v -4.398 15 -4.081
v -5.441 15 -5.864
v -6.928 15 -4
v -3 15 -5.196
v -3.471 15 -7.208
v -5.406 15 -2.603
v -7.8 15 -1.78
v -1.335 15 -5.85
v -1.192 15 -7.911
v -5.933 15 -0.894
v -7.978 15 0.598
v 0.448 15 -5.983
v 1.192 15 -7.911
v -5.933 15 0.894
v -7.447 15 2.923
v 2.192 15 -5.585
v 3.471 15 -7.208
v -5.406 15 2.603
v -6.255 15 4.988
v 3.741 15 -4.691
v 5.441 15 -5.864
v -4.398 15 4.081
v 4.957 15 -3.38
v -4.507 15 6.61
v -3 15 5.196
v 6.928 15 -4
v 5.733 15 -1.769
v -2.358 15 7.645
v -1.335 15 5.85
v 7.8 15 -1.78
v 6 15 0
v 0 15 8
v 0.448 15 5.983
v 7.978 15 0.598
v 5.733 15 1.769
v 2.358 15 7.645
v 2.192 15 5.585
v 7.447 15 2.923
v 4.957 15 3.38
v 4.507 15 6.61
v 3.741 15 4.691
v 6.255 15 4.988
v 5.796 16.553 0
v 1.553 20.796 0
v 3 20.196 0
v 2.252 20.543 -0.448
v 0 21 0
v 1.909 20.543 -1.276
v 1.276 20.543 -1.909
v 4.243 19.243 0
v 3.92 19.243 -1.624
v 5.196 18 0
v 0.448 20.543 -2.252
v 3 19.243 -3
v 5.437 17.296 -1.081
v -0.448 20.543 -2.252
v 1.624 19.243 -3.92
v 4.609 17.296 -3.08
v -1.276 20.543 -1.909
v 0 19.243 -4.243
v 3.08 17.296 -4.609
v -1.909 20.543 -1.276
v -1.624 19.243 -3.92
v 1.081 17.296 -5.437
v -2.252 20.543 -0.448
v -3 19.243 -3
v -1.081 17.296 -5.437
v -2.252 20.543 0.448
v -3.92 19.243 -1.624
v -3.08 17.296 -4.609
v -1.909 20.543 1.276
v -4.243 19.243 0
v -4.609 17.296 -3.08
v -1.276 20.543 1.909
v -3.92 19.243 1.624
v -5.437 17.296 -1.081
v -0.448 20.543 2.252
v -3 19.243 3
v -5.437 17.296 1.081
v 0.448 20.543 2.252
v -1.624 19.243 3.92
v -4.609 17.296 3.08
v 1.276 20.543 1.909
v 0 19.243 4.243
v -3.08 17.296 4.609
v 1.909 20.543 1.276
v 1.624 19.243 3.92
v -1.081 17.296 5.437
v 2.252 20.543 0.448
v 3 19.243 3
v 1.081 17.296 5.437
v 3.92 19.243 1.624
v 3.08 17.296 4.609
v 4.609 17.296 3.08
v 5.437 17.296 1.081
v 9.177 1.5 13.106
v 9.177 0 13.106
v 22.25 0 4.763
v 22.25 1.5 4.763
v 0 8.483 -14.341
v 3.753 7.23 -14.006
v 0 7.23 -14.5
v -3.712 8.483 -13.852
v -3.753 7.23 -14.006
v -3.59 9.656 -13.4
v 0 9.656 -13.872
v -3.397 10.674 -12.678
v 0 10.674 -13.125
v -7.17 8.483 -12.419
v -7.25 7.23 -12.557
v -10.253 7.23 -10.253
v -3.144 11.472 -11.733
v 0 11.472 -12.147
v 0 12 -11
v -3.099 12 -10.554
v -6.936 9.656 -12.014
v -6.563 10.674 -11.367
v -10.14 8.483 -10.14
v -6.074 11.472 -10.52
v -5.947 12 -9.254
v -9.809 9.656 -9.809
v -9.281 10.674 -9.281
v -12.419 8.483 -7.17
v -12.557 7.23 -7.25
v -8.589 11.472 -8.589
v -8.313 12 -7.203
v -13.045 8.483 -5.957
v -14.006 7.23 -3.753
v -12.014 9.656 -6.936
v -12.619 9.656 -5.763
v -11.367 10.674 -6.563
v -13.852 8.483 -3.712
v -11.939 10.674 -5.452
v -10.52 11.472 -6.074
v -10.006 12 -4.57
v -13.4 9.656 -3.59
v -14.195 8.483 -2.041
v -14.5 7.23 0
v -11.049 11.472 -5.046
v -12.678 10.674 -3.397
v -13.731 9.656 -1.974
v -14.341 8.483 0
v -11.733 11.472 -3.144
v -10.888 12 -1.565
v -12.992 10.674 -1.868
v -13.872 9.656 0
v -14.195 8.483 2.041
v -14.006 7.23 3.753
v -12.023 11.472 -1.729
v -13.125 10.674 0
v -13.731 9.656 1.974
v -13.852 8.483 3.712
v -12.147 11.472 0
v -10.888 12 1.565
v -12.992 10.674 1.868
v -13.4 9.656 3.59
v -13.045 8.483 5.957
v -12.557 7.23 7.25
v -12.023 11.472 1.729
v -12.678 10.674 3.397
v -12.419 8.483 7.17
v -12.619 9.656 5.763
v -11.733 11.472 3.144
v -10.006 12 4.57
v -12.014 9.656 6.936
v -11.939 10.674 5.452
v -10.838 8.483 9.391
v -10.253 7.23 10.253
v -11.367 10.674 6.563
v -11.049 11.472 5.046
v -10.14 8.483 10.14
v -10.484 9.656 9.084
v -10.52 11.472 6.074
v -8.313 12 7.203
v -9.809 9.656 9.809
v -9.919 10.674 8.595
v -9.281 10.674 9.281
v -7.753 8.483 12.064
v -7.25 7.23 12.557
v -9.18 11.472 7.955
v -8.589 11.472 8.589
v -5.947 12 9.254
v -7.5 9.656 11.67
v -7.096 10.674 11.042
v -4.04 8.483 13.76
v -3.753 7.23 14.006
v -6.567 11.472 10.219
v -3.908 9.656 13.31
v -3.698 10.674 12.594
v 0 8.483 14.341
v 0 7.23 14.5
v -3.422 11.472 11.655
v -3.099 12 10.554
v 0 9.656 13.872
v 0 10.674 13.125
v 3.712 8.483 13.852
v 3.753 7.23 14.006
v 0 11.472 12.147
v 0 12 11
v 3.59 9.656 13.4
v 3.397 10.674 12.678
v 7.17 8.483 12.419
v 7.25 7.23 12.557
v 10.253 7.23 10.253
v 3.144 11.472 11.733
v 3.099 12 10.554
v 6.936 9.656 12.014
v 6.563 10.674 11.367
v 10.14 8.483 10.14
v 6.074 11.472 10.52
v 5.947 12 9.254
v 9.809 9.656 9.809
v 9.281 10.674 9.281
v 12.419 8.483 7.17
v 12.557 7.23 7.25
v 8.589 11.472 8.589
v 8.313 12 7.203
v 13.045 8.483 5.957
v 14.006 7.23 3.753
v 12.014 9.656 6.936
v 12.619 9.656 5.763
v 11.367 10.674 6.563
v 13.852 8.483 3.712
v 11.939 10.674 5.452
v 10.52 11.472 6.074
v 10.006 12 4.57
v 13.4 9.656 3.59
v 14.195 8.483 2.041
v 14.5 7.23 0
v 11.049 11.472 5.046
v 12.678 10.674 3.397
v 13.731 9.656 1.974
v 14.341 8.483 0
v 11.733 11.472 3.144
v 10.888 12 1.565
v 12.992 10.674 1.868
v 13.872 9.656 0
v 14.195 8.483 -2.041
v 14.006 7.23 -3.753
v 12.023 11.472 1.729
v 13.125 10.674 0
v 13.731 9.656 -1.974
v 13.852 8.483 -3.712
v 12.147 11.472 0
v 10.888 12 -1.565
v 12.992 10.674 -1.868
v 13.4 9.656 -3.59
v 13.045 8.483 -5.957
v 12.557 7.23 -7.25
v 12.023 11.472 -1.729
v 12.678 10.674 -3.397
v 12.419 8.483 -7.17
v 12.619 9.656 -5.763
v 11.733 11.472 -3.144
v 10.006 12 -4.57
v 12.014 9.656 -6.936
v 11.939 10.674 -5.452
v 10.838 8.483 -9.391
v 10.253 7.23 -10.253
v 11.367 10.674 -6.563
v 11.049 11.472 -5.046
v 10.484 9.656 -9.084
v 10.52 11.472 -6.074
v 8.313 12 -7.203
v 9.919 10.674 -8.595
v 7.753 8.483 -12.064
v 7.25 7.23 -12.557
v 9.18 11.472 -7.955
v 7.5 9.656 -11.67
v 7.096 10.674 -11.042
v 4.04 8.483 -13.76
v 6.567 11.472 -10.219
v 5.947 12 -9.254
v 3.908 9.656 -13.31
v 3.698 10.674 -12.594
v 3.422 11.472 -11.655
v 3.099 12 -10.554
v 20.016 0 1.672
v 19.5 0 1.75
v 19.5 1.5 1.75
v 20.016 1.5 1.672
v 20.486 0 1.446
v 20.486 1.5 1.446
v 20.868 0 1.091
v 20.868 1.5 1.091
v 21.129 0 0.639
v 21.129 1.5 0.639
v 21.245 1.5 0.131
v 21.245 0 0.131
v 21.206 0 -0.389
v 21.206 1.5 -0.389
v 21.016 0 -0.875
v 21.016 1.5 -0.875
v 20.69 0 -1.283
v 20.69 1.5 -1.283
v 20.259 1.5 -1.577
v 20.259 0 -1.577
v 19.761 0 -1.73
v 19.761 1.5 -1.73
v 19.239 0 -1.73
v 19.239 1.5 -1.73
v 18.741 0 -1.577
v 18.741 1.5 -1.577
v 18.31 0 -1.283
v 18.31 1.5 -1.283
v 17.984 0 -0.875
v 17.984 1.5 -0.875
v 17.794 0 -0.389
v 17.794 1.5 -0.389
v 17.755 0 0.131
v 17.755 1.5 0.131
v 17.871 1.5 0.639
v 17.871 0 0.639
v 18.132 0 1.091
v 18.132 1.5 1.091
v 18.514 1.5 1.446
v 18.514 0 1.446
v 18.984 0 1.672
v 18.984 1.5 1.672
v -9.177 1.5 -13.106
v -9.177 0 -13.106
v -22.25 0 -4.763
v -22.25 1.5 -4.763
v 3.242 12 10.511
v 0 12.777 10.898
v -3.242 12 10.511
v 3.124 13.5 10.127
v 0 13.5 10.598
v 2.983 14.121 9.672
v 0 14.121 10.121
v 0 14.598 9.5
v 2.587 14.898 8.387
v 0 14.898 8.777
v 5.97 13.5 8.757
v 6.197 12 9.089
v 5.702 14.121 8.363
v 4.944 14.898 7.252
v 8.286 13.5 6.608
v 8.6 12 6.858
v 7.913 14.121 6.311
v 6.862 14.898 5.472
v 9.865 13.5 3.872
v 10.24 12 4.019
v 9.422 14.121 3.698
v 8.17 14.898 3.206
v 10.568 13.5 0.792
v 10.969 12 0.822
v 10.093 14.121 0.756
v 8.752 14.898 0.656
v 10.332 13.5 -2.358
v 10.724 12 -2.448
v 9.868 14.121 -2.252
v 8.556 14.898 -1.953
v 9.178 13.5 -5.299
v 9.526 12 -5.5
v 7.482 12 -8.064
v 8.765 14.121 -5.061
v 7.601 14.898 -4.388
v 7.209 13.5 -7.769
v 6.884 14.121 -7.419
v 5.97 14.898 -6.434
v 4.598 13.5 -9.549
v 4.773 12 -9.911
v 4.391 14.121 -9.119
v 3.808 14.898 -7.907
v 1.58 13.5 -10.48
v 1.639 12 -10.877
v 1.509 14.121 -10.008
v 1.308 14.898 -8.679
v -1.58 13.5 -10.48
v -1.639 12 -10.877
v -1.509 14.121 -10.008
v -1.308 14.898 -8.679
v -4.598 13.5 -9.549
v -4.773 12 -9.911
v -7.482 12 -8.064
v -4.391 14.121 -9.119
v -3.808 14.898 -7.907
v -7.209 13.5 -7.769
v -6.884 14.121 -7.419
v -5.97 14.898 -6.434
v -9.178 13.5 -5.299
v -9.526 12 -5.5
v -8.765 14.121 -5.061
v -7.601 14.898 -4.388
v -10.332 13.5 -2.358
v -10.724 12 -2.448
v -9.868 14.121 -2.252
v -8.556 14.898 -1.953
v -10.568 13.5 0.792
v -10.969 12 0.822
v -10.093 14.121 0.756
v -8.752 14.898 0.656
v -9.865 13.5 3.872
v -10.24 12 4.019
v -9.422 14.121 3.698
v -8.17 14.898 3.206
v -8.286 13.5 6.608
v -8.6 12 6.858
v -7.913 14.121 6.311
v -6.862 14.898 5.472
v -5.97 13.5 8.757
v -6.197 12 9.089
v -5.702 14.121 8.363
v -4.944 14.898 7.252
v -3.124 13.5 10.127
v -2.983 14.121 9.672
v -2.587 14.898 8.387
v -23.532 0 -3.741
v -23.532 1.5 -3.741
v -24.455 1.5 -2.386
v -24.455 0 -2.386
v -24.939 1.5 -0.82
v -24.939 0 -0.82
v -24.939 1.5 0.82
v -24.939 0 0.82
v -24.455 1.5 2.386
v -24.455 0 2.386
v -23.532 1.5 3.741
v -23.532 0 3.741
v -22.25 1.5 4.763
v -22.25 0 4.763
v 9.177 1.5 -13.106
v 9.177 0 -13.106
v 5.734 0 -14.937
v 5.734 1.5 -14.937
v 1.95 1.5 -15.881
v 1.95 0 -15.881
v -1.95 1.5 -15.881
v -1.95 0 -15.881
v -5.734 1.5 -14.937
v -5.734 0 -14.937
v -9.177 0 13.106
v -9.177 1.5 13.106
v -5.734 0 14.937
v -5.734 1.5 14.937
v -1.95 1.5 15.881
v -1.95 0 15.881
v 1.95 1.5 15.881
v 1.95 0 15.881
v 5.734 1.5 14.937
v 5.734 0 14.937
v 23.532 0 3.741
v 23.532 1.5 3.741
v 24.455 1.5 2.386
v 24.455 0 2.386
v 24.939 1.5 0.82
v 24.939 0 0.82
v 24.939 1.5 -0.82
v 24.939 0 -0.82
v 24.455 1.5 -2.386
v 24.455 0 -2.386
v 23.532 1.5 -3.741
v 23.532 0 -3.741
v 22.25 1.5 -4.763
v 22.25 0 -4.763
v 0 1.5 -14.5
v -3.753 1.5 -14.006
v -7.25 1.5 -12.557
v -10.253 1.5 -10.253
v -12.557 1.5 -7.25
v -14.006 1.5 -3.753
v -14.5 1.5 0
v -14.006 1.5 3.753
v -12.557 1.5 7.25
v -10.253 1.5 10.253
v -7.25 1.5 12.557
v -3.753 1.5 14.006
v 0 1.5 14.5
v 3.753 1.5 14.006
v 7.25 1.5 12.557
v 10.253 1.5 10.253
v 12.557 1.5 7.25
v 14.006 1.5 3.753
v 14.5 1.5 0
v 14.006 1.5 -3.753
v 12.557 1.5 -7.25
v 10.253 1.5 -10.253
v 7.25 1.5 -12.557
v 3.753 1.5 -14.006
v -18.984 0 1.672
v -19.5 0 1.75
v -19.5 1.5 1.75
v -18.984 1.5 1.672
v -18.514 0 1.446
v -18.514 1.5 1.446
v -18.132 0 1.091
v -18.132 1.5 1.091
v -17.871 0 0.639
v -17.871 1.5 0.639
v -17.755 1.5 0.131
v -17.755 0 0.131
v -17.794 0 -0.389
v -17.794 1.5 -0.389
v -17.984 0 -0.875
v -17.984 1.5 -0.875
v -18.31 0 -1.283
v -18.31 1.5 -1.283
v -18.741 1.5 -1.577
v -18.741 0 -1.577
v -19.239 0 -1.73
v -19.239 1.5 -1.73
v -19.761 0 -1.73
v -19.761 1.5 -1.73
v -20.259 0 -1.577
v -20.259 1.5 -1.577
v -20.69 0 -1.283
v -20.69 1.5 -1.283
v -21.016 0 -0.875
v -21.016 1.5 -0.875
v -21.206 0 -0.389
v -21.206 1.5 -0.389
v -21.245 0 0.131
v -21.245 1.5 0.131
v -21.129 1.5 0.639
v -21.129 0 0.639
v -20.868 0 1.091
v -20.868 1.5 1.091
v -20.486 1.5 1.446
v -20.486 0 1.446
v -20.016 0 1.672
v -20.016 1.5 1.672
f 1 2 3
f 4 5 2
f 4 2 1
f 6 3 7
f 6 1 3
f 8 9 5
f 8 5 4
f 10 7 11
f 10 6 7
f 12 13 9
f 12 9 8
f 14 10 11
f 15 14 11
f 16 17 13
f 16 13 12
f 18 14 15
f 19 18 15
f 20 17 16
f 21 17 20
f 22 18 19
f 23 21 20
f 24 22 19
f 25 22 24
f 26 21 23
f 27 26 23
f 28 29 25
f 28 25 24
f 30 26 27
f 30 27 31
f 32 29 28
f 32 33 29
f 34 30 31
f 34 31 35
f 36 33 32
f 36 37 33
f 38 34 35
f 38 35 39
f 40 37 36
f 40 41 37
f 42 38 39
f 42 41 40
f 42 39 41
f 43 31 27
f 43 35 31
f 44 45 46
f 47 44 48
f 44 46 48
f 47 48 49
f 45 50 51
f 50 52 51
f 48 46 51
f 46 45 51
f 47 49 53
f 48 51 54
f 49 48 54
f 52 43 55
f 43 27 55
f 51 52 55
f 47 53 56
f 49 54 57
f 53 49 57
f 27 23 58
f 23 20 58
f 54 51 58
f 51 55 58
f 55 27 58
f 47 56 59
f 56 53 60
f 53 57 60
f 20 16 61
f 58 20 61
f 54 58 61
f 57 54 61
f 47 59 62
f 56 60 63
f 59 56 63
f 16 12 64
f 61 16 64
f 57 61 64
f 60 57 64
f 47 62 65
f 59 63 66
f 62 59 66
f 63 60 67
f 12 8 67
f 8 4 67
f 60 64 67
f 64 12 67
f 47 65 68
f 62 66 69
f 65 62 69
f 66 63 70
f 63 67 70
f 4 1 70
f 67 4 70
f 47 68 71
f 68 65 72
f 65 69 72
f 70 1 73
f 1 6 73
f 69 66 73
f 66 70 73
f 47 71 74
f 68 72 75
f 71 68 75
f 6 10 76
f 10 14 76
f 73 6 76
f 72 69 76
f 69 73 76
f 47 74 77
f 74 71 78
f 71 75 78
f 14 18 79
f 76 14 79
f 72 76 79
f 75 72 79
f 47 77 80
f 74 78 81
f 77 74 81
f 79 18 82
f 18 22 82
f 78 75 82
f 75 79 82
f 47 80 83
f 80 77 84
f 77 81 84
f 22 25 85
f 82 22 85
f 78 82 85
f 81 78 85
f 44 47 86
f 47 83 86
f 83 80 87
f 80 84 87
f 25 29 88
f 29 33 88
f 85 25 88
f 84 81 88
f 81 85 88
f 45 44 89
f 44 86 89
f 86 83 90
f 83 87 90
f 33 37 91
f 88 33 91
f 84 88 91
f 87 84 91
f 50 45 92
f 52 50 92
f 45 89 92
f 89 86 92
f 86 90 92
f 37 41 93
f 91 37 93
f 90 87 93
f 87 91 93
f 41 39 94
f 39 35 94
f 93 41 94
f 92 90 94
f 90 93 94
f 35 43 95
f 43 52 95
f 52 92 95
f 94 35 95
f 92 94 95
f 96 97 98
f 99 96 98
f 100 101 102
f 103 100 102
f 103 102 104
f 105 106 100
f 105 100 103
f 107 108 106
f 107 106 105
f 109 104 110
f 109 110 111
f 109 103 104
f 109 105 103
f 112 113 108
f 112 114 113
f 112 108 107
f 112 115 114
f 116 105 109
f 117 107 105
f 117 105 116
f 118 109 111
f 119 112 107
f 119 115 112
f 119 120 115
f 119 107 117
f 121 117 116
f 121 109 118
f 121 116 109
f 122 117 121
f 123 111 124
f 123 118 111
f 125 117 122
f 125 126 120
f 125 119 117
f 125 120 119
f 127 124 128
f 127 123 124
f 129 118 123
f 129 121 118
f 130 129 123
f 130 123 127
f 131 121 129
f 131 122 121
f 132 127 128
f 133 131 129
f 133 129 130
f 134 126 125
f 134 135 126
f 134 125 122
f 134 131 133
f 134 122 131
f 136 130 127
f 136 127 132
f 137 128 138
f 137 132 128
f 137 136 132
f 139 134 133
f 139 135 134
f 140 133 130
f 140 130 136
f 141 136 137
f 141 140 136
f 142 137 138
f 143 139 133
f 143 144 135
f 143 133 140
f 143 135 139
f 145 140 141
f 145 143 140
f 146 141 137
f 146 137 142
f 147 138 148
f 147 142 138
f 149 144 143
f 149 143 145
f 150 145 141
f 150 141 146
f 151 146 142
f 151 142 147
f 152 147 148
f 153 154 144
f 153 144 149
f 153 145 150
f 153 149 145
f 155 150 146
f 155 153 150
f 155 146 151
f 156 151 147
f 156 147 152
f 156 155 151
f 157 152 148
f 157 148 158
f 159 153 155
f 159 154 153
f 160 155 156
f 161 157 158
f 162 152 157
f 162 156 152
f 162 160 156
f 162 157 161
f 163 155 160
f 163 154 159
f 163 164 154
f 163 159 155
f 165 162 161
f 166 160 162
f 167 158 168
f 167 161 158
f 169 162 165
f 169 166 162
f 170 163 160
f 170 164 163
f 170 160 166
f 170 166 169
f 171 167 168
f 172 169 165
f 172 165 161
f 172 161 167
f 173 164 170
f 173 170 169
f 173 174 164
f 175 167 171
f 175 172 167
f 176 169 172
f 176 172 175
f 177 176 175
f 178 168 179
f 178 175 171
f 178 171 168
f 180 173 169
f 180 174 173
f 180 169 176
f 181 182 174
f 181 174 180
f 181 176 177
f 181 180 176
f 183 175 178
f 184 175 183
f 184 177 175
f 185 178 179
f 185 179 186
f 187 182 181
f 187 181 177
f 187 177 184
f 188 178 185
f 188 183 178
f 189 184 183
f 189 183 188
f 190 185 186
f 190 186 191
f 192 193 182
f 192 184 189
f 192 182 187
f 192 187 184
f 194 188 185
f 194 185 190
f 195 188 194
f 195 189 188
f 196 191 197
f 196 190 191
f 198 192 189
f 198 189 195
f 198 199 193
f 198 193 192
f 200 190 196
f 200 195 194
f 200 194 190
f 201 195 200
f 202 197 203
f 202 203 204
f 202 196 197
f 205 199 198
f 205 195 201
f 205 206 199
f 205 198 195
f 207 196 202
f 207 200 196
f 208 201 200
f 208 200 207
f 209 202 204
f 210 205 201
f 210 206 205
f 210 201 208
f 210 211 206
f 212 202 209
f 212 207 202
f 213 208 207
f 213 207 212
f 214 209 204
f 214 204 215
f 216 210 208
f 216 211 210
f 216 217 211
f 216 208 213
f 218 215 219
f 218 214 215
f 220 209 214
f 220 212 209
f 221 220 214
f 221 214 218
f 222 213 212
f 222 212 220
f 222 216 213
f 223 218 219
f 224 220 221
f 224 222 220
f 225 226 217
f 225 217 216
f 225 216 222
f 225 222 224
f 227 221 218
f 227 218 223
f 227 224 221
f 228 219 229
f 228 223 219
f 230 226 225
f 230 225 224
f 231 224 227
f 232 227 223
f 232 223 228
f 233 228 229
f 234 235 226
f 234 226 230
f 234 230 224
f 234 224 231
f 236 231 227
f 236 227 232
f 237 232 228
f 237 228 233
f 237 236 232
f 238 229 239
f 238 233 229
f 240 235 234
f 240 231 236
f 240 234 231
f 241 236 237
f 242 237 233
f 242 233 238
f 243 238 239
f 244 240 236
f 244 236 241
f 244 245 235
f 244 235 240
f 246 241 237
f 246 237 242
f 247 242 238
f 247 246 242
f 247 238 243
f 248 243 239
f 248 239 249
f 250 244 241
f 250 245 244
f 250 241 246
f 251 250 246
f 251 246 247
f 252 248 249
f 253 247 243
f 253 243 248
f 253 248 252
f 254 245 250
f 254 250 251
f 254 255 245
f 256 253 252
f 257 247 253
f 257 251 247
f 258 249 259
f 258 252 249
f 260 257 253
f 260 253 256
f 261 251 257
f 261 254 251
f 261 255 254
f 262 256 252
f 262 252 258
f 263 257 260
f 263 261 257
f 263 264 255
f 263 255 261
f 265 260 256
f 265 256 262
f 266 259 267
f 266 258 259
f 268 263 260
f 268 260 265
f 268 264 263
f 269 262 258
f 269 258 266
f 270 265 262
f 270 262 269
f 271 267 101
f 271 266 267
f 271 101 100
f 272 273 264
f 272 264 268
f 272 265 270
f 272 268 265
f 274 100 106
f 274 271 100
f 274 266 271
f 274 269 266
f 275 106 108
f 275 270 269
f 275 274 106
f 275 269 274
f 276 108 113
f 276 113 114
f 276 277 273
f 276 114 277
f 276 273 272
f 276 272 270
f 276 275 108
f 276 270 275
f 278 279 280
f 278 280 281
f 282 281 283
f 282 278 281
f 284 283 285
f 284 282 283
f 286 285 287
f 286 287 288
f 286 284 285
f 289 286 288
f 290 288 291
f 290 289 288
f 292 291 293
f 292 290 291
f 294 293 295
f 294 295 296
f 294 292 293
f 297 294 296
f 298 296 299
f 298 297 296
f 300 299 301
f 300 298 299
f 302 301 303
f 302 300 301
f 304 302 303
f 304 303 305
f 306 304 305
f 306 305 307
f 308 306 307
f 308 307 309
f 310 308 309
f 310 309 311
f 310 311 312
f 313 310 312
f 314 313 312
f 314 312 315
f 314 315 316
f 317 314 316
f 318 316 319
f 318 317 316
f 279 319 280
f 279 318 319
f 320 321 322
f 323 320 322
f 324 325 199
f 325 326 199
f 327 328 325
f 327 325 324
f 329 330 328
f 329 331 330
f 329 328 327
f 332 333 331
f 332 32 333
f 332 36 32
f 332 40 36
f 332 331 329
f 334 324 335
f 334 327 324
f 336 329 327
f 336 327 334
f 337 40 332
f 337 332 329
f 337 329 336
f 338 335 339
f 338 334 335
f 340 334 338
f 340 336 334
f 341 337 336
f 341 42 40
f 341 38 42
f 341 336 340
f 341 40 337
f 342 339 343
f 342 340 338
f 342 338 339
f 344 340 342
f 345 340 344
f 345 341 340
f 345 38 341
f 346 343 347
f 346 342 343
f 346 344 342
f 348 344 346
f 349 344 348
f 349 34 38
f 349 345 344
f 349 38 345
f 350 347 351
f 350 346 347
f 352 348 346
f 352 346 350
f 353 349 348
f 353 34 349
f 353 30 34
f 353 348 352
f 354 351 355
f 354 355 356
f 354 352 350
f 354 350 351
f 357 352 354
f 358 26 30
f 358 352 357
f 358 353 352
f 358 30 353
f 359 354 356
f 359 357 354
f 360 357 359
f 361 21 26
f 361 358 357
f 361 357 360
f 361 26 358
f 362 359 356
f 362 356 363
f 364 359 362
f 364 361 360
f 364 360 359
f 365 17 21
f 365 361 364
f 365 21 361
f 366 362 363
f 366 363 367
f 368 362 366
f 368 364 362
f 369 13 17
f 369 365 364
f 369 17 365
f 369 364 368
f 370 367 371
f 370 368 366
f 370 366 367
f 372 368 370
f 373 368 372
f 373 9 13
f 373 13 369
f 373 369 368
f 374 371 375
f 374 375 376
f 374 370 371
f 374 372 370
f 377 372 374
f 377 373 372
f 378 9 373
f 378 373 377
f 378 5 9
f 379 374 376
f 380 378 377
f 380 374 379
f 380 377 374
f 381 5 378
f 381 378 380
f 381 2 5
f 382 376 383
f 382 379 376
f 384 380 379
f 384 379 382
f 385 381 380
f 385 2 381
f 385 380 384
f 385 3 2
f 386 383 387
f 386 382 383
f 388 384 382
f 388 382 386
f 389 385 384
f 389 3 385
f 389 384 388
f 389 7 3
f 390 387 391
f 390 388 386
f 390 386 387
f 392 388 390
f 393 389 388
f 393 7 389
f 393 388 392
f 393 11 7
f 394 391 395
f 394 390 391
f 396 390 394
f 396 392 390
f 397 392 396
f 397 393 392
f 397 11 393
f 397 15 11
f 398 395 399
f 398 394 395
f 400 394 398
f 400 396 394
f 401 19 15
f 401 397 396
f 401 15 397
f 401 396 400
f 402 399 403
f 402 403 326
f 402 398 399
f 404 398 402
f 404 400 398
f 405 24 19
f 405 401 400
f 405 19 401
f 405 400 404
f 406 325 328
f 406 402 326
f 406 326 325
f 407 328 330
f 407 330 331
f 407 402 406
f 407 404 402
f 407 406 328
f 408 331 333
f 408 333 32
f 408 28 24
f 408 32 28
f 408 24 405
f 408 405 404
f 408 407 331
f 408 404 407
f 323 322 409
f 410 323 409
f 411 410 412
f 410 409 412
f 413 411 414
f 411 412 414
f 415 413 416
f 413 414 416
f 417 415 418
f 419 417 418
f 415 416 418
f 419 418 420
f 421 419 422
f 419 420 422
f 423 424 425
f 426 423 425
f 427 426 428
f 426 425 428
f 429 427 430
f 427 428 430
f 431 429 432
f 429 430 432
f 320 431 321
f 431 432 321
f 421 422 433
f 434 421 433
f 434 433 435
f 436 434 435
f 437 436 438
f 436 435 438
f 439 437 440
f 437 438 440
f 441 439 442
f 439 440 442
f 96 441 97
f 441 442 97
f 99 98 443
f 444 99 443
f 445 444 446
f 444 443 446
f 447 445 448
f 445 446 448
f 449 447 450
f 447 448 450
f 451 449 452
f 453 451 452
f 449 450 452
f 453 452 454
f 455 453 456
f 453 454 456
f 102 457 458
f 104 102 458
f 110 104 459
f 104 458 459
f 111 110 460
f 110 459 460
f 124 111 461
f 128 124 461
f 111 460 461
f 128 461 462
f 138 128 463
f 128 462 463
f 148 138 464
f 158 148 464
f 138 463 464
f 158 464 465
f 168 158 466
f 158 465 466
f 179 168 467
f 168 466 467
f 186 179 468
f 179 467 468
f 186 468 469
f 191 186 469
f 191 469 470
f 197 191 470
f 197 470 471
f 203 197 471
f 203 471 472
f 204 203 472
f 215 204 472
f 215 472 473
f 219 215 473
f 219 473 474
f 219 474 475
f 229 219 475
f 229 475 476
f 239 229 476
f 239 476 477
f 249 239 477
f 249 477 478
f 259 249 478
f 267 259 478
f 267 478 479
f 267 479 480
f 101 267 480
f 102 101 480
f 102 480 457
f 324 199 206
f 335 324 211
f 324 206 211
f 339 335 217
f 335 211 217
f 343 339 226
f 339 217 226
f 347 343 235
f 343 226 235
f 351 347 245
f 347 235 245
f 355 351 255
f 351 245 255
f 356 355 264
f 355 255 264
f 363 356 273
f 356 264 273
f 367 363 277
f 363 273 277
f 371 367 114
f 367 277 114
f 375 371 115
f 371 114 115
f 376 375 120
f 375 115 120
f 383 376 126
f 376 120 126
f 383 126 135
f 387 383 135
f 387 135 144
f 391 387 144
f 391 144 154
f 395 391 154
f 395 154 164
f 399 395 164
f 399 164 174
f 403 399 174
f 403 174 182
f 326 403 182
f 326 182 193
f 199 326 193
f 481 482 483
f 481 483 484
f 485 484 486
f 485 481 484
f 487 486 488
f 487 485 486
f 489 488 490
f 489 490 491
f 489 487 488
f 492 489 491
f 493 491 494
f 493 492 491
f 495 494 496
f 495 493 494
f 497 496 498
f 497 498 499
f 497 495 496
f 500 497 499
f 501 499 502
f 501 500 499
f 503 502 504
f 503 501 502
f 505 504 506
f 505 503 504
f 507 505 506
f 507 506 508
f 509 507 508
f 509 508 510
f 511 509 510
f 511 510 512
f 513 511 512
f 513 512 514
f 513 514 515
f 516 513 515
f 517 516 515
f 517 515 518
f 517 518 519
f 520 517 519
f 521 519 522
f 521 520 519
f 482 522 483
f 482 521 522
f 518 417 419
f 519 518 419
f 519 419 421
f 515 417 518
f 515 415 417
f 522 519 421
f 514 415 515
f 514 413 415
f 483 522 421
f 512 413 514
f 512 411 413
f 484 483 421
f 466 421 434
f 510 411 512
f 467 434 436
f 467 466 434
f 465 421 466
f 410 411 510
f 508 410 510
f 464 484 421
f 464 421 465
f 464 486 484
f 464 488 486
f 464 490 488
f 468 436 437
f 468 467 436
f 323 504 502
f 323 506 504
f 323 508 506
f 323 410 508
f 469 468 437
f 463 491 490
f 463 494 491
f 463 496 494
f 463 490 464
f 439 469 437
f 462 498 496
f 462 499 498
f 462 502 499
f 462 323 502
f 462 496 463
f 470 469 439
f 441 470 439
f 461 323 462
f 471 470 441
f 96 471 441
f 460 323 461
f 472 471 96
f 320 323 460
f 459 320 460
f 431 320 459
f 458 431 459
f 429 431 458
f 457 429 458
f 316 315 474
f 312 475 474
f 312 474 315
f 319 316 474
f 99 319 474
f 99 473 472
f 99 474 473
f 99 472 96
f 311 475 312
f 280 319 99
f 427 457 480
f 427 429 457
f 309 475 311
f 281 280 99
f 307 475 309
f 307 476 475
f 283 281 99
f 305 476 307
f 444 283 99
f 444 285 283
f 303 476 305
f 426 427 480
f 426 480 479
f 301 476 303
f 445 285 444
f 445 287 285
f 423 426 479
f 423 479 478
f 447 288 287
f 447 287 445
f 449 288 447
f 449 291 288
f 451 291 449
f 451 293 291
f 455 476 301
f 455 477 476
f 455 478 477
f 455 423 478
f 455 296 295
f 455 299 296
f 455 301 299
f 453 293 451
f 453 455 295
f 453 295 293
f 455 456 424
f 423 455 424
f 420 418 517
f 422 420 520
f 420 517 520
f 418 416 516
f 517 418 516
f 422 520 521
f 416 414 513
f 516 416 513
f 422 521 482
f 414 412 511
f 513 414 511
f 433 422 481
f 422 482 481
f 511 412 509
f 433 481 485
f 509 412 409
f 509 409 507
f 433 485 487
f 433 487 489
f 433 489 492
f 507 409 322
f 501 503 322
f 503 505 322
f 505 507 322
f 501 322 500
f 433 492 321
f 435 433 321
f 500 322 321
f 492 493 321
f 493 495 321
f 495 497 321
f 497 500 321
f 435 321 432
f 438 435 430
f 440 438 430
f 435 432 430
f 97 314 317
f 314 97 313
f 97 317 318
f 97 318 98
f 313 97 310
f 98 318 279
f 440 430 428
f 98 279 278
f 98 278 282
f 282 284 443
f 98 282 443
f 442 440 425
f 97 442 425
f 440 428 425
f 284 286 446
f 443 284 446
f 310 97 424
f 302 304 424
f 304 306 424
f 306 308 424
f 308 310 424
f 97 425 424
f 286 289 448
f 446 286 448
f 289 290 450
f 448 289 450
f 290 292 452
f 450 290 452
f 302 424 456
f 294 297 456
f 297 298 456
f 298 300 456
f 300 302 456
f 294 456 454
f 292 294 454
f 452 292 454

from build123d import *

# Parameters (mm, degrees)
SKETCH1_R           = 1.75
BOSS_EXTRUDE1_DEPTH = 1.5
SKETCH2_R           = 14.5
BOSS_EXTRUDE2_DEPTH = 10.5
SKETCH3_R           = 11
BOSS_EXTRUDE3_DEPTH = 3
FILLET1_R           = 5
FILLET2_R           = 3


# Some blends are built 0.0001 mm under size
with BuildPart() as part:
    # Sketch1 → Boss-Extrude1 (new body)
    with BuildSketch(Plane(origin=(0, 0, 0), x_dir=(1, 0, 0), z_dir=(0, 1, 0))):
        with BuildLine():
            Line((-22.25, -4.763139721), (-9.177222982, -13.106432709))
            ThreePointArc((-9.177222982, -13.106432709), (0, -16), (9.177222982, -13.106432709))
            Line((9.177222982, -13.106432709), (22.25, -4.763139721))
            ThreePointArc((22.25, -4.763139721), (25, 0), (22.25, 4.763139721))
            Line((22.25, 4.763139721), (9.177222982, 13.106432709))
            ThreePointArc((9.177222982, 13.106432709), (0, 16), (-9.177222982, 13.106432709))
            Line((-9.177222982, 13.106432709), (-22.25, 4.763139721))
            ThreePointArc((-22.25, 4.763139721), (-25, 0), (-22.25, -4.763139721))
        make_face()
        with Locations(Location((-19.5, 0, 0), (0, 0, 270))):
            Circle(SKETCH1_R, mode=Mode.SUBTRACT)
        with Locations(Location((19.5, 0, 0), (0, 0, 270))):
            Circle(SKETCH1_R, mode=Mode.SUBTRACT)
    extrude(amount=BOSS_EXTRUDE1_DEPTH)

    # Sketch2 → Boss-Extrude2 (add)
    with BuildSketch(Plane(origin=(0, 1.5, 0), x_dir=(1, 0, 0), z_dir=(0, 1, 0))):
        with Locations(Location((0, 0, 0), (0, 0, 90))):
            Circle(SKETCH2_R)
    extrude(amount=BOSS_EXTRUDE2_DEPTH)

    # Sketch3 → Boss-Extrude3 (add)
    with BuildSketch(Plane(origin=(0, 12, 0), x_dir=(1, 0, 0), z_dir=(0, 1, 0))):
        with Locations(Location((0, 0, 0), (0, 0, 270))):
            Circle(SKETCH3_R)
    extrude(amount=BOSS_EXTRUDE3_DEPTH)

    # Sketch5 → Revolve1 (revolve)
    with BuildSketch(Plane.XY):
        with BuildLine():
            Line((0, 15), (0, 21))
            ThreePointArc((0, 21), (4.242640687, 19.242640687), (6, 15))
            Line((6, 15), (0, 15))
        make_face()
    revolve(axis=Axis((0, 15, 0), (0, 1, 0)))

    # Fillet1
    # the kernel refuses this fillet: 5 mm, written as the material it takes off along each edge
    with BuildSketch(Plane(origin=(0, 12, 0), x_dir=(0, 0, -1), z_dir=(1, 0, 0))) as fillet1_piece_1:
        with BuildLine():
            CenterArc((9.5, -4.769696007), FILLET1_R, 0, 72.542396876)
            Line((11, 0), (11.03, 0.09539392))
            ThreePointArc((11.03, 0.09539392), (12.75, 0.1), (14.5, 0.1))
            Line((14.5, 0.1), (14.6, 0))
            Line((14.6, 0), (14.6, -4.769696007))
            Line((14.6, -4.769696007), (14.5, -4.769696007))
        make_face()
    revolve(axis=Axis((0, 12, 0), (0, 1, 0)), mode=Mode.SUBTRACT)

    # Fillet2
    fillet2_edges = [part.edges().sort_by_distance(p)[0] for p in [
        (0, 15, -11),
    ]]
    fillet(fillet2_edges, radius=FILLET2_R - 0.0001)  # a hair under: the kernel refuses the full size


solid = part.part
